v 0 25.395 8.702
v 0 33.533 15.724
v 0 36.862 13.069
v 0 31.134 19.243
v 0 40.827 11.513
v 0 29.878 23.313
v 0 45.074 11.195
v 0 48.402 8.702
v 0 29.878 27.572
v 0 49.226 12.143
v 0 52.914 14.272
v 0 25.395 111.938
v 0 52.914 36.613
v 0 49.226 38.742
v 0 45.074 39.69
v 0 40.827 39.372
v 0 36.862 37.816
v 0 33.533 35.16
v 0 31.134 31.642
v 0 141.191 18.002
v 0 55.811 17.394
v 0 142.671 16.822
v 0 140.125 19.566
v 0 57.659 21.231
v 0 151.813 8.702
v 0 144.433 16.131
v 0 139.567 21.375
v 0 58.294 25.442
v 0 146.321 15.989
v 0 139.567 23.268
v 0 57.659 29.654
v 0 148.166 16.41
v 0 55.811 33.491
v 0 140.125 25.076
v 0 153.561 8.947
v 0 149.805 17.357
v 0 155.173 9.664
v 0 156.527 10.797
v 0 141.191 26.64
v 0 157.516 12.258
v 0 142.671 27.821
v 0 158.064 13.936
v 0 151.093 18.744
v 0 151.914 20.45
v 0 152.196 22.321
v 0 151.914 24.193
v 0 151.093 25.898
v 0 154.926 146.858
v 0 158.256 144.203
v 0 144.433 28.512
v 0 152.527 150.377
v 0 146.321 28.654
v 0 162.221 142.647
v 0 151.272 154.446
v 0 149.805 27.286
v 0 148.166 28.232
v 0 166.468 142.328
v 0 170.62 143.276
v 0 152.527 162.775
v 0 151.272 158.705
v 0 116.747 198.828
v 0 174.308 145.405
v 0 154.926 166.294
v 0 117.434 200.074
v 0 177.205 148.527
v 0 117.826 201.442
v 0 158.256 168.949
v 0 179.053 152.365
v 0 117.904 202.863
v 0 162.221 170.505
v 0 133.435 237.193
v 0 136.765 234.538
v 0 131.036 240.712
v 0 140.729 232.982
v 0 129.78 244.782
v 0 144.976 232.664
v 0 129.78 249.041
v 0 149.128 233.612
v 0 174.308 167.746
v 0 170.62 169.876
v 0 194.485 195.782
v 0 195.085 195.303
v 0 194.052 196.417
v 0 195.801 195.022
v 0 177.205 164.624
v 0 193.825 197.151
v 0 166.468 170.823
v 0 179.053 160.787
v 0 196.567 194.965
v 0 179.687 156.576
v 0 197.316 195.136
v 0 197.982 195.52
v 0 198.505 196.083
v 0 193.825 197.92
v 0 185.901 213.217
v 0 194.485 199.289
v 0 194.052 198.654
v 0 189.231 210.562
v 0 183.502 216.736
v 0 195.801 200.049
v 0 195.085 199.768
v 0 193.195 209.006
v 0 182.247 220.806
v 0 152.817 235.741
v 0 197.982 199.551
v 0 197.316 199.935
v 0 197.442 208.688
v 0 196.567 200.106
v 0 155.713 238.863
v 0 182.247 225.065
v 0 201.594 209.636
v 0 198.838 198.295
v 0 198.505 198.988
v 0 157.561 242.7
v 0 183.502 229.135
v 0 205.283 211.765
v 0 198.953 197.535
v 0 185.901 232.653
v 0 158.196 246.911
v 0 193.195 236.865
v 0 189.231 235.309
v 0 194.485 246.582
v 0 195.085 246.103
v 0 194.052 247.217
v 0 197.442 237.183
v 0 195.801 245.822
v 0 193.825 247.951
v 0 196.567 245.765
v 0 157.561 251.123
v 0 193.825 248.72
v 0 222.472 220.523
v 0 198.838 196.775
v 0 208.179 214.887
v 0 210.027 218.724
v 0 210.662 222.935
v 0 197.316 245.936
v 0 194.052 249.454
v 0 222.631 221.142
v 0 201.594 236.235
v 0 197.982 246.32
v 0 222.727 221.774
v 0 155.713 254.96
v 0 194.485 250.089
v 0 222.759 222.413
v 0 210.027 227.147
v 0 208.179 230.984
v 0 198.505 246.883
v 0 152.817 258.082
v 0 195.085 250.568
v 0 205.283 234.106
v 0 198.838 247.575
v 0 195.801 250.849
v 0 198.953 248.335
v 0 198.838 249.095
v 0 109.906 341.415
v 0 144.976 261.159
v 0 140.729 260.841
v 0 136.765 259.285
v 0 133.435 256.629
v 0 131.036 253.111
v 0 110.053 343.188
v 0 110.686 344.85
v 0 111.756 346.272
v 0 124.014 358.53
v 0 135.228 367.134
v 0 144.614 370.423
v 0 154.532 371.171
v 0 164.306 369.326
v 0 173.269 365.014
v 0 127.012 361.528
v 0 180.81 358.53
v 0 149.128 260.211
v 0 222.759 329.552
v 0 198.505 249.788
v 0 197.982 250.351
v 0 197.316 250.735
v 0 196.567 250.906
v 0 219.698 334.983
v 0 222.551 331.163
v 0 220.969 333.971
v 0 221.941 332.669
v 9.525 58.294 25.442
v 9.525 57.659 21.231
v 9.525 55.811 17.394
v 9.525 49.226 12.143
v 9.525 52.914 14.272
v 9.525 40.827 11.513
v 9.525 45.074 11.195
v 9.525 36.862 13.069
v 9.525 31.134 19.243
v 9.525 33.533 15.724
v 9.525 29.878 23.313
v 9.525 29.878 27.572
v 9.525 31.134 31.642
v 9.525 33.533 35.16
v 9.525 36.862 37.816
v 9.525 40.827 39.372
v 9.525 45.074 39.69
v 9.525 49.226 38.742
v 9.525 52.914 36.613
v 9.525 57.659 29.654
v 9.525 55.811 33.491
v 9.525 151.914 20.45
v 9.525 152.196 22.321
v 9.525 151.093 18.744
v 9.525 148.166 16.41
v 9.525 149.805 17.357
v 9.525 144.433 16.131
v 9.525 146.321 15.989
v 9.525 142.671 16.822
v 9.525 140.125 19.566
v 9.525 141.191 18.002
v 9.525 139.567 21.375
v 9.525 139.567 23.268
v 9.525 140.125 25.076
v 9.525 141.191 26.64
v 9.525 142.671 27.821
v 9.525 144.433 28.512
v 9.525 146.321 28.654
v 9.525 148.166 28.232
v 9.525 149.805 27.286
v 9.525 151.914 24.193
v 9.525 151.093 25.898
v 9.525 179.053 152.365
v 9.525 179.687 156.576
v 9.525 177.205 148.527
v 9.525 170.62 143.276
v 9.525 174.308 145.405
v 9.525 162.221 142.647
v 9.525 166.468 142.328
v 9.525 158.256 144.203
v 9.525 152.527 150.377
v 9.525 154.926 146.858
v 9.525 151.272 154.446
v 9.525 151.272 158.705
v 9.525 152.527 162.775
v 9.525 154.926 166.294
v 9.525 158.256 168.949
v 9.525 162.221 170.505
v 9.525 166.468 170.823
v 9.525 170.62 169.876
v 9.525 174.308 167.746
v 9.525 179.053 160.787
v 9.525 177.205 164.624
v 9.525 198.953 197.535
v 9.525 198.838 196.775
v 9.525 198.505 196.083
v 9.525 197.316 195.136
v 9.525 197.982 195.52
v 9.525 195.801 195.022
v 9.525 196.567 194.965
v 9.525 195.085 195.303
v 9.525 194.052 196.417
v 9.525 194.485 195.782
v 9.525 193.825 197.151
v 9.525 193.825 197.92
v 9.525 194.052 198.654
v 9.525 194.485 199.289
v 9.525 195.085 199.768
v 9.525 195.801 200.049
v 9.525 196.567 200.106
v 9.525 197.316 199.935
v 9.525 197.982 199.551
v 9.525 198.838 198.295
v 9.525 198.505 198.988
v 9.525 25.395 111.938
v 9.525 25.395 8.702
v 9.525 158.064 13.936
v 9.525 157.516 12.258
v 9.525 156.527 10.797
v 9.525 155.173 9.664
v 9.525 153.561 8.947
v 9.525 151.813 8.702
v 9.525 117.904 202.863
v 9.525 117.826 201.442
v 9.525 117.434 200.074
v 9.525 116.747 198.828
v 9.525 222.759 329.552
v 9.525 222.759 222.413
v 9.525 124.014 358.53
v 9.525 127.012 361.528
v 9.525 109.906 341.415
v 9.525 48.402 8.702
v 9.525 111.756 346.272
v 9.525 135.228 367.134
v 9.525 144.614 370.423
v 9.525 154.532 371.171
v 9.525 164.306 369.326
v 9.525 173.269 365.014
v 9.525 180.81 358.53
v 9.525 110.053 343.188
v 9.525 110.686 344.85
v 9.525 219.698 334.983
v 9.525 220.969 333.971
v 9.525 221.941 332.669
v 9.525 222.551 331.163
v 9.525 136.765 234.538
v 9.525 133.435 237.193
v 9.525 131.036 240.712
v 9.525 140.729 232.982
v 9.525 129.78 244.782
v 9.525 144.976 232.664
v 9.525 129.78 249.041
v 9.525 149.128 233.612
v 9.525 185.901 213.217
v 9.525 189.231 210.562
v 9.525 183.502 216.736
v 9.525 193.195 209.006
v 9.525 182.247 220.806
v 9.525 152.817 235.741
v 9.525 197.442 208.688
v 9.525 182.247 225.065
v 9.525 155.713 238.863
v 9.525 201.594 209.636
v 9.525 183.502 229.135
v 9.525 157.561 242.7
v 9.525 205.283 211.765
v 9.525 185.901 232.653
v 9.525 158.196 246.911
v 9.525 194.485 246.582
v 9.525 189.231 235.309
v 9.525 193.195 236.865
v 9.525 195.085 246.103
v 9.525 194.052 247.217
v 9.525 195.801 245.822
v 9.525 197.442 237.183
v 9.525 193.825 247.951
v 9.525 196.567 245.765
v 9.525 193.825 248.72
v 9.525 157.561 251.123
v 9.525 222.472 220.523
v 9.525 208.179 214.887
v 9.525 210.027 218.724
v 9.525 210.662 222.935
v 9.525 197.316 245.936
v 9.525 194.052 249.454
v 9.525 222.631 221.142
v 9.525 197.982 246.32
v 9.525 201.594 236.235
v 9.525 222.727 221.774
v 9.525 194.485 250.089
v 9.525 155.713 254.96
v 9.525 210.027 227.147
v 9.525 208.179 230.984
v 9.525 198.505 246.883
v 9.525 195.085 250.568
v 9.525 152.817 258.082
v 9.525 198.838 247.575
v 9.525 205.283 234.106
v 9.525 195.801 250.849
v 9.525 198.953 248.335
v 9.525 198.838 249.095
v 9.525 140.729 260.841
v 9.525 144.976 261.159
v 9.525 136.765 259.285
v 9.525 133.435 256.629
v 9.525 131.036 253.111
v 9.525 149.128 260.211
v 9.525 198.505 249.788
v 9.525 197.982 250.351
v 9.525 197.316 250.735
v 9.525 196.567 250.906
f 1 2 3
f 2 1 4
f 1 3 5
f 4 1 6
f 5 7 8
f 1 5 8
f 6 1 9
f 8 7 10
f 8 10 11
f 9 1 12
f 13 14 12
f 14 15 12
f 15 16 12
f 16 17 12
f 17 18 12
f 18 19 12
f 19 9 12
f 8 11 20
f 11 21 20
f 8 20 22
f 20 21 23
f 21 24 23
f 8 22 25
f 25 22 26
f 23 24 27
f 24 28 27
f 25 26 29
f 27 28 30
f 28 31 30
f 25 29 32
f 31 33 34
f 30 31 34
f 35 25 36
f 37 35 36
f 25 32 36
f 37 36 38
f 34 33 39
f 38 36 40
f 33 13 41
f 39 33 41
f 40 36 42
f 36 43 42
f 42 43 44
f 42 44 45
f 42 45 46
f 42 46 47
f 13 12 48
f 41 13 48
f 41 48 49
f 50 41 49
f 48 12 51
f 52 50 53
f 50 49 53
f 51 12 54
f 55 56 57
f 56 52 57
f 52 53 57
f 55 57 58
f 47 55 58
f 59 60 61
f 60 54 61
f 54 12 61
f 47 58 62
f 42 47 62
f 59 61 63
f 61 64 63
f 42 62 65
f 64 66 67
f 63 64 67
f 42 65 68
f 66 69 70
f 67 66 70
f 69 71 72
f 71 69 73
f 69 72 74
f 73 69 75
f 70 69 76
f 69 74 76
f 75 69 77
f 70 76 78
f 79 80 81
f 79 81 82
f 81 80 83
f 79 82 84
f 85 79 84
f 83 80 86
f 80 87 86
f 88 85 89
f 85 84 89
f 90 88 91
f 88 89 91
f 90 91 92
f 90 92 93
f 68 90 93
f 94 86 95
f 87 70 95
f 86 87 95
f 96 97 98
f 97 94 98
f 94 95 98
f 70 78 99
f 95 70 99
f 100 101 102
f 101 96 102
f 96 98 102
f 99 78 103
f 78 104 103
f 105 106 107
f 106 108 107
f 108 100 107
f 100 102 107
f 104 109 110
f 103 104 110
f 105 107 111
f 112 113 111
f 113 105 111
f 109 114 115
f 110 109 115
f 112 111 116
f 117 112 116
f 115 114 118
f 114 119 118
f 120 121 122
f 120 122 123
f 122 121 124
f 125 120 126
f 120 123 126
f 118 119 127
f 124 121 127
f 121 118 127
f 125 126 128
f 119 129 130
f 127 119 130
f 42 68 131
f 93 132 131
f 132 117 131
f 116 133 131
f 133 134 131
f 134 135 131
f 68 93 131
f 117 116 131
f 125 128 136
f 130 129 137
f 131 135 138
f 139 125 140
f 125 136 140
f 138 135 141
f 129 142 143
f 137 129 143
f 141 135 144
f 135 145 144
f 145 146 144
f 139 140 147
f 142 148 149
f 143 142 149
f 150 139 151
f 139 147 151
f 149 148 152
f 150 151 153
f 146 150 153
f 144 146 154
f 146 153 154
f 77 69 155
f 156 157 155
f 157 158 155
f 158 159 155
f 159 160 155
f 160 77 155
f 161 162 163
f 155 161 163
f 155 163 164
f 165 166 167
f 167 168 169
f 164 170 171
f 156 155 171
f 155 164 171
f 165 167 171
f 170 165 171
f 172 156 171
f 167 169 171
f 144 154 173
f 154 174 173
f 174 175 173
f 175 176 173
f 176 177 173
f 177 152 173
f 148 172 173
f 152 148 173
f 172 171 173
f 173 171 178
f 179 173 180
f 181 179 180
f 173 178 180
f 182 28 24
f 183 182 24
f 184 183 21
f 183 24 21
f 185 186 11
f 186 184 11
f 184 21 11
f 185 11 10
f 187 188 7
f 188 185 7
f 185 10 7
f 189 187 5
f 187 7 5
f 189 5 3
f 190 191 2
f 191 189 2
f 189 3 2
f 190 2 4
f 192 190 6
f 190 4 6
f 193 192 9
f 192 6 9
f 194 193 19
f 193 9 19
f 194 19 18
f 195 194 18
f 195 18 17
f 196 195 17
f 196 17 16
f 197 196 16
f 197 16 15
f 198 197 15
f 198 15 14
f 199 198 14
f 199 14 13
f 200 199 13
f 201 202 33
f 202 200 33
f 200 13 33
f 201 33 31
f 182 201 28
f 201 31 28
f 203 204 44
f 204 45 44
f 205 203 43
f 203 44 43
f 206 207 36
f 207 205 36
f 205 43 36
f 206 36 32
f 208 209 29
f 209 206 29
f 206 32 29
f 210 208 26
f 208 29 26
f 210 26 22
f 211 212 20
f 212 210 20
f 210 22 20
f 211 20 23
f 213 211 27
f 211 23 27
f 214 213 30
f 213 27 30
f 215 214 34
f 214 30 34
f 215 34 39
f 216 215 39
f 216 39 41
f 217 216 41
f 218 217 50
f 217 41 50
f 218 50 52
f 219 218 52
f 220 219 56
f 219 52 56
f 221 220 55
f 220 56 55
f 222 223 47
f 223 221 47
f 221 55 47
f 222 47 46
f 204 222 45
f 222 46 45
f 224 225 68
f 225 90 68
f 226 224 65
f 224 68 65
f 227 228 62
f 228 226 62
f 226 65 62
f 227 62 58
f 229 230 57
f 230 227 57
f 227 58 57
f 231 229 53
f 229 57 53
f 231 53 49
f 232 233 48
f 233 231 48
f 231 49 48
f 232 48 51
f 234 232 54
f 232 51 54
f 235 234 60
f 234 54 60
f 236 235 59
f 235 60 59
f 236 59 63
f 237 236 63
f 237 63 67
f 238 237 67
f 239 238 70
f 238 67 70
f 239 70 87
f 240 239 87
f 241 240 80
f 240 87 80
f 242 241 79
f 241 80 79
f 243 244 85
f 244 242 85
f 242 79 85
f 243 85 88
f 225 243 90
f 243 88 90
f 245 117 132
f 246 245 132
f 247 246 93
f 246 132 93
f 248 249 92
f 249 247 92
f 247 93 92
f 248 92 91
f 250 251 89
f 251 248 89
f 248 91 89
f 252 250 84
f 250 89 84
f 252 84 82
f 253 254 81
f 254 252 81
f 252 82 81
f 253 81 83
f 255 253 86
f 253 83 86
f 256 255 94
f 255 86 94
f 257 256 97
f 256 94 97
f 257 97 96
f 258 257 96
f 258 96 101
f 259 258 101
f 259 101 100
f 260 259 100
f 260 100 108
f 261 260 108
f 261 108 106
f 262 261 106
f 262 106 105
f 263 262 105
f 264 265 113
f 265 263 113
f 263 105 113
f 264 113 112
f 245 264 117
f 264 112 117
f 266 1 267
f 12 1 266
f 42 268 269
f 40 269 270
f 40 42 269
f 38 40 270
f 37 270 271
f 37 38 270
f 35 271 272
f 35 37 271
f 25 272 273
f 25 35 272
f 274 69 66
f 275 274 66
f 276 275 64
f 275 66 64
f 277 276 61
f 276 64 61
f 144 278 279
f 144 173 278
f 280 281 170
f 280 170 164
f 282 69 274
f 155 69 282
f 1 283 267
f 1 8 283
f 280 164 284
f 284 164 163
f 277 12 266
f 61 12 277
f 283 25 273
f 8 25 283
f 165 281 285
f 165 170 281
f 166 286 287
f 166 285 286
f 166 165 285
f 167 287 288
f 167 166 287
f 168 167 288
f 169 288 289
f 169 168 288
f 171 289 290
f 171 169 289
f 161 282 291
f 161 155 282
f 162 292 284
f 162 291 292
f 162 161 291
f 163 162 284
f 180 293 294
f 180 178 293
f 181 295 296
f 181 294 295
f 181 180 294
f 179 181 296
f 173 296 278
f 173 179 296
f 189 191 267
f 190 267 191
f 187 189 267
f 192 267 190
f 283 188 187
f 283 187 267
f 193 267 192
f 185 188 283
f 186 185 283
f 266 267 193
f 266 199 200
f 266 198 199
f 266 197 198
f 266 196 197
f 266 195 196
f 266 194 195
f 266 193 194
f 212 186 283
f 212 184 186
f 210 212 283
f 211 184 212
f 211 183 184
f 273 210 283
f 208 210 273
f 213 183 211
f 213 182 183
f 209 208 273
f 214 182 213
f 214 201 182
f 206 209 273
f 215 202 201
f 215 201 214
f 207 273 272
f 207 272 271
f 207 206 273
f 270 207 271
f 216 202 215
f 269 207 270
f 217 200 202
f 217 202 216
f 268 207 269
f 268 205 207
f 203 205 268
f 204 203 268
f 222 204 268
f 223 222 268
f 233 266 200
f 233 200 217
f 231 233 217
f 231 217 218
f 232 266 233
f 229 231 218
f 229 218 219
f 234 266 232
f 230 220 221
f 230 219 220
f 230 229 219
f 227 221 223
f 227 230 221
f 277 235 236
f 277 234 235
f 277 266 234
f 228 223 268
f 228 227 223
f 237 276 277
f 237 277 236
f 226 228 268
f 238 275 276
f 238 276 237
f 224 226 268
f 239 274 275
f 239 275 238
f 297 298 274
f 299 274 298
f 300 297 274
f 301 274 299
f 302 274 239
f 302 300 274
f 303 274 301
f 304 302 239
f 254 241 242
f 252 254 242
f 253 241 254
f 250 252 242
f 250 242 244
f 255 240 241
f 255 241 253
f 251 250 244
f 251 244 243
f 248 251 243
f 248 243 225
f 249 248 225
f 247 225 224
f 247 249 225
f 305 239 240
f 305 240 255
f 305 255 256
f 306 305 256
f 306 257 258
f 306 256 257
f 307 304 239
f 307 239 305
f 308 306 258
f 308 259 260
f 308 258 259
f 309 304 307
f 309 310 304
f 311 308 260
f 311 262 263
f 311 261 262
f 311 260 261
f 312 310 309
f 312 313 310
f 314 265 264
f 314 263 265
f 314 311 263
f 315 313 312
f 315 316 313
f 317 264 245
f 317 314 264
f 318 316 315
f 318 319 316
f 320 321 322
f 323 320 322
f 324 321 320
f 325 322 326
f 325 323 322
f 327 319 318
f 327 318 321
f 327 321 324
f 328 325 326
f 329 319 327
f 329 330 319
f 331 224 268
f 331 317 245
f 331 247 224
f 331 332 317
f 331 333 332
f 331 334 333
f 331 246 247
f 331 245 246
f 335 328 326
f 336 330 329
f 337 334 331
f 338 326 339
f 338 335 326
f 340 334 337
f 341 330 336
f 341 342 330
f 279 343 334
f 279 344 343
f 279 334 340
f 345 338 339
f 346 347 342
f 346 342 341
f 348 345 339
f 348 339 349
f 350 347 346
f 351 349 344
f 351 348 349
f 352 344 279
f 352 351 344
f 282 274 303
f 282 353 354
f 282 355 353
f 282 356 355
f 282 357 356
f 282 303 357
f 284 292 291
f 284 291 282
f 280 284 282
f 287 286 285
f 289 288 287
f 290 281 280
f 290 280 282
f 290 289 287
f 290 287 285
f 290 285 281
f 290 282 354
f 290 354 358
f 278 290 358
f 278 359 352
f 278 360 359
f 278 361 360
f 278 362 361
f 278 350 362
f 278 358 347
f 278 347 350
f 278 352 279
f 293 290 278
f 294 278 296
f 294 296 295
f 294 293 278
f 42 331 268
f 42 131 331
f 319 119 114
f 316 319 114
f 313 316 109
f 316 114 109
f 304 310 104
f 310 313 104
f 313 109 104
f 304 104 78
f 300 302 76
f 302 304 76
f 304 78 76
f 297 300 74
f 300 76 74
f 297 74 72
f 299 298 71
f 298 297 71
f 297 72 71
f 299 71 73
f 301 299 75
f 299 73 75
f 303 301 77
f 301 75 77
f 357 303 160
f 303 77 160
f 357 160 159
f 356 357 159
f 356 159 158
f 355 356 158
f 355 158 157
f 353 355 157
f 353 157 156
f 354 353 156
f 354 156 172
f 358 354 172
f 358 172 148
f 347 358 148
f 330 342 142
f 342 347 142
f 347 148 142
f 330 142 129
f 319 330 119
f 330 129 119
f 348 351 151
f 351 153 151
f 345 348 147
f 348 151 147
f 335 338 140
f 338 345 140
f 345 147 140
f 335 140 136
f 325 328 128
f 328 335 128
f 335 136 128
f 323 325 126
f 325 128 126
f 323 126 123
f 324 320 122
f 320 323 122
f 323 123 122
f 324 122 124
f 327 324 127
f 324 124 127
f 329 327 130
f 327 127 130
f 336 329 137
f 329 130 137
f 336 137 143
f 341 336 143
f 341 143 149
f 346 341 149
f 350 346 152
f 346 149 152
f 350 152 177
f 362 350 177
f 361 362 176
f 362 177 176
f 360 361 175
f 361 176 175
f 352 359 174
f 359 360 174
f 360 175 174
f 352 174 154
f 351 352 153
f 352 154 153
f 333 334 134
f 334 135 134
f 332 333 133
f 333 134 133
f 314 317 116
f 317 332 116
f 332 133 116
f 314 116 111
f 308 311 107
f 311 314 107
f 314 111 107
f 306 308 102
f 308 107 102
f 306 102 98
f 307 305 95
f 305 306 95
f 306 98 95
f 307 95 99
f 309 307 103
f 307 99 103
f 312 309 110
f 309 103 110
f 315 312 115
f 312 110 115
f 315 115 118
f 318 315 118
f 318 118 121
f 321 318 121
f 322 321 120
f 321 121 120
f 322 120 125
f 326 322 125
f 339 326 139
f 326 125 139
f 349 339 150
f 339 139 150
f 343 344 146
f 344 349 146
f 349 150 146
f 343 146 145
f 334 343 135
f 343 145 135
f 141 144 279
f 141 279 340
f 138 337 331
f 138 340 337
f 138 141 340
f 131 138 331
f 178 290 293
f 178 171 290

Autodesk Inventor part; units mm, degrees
ref_plane "YZ Plane" through (0, 0, 0) normal (1, 0, 0) x (0, 1, 0)
ref_plane "XZ Plane" through (0, 0, 0) normal (0, 1, 0) x (-1, 0, 0)
ref_plane "XY Plane" through (0, 0, 0) normal (0, 0, 1) x (1, 0, 0)
sketch "Sketch1" plane through (0, 0, 0) normal (1, 0, 0) x (0, 1, 0)
  circle A0 centre (143.9084, 246.9114) radius 25.4 construction
  circle A1 centre (165.3998, 156.5759) radius 25.4 construction
  circle A2 centre (143.9084, 246.9114) radius 14.2875
  circle A3 centre (165.3998, 156.5759) radius 14.2875
  arc A4 (180.8102, 358.5299) -> (124.0141, 358.5299) centre (152.4121, 333.1299) ccw
  line L0 (127.0121, 361.528) -> (111.7556, 346.2715)
  line L1 (151.8132, 8.702) -> (48.4022, 8.702)
  line L2 (117.9037, 202.8627) -> (109.9063, 341.4154)
  arc A5 (111.7556, 346.2715) -> (109.9063, 341.4154) centre (116.2457, 341.7813) ccw
  arc A6 (116.7471, 198.8279) -> (117.9037, 202.8627) centre (111.5643, 202.4968) ccw
  arc A7 (151.8132, 8.702) -> (158.0642, 13.9355) centre (151.8132, 15.052) ccw
  circle A8 centre (44.0062, 25.4424) radius 14.2875
  line L3 (48.4022, 8.702) -> (25.3949, 8.702)
  line L4 (180.8102, 358.5299) -> (219.6983, 334.9834)
  line L5 (222.7593, 329.5515) -> (222.7593, 222.4129)
  line L6 (222.4715, 220.5229) -> (158.0642, 13.9355)
  arc A9 (222.7593, 329.5515) -> (219.6983, 334.9834) centre (216.4093, 329.5515) ccw
  arc A10 (222.4715, 220.5229) -> (222.7593, 222.4129) centre (216.4093, 222.4129) ccw
  circle A11 centre (196.3745, 222.9354) radius 14.2875
  circle A12 centre (196.3745, 197.5354) radius 2.5781
  circle A13 centre (196.3745, 248.3354) radius 2.5781
  line L7 (25.3949, 111.9383) -> (116.7471, 198.8279)
  line L8 (25.3949, 8.702) -> (25.3949, 111.9383)
  circle A14 centre (145.8462, 22.3213) radius 6.35
  point P0 (177.8121, 361.528)
  dimension "d2" = 28.575
  dimension "d3" = 28.575
  dimension "d18" = 6.35
  dimension "d19" = 28.575
  dimension "d21" = 5.1562
  dimension "d36" = 12.7
extrude "Extrusion1" add sketch "Sketch1" along normal blind 9.525 contours L4 A9 L5 A10 L6 A7 L1 L3 L8 L7 A6 L2 A5 L0 A4
properties part number "Intake-v1"
